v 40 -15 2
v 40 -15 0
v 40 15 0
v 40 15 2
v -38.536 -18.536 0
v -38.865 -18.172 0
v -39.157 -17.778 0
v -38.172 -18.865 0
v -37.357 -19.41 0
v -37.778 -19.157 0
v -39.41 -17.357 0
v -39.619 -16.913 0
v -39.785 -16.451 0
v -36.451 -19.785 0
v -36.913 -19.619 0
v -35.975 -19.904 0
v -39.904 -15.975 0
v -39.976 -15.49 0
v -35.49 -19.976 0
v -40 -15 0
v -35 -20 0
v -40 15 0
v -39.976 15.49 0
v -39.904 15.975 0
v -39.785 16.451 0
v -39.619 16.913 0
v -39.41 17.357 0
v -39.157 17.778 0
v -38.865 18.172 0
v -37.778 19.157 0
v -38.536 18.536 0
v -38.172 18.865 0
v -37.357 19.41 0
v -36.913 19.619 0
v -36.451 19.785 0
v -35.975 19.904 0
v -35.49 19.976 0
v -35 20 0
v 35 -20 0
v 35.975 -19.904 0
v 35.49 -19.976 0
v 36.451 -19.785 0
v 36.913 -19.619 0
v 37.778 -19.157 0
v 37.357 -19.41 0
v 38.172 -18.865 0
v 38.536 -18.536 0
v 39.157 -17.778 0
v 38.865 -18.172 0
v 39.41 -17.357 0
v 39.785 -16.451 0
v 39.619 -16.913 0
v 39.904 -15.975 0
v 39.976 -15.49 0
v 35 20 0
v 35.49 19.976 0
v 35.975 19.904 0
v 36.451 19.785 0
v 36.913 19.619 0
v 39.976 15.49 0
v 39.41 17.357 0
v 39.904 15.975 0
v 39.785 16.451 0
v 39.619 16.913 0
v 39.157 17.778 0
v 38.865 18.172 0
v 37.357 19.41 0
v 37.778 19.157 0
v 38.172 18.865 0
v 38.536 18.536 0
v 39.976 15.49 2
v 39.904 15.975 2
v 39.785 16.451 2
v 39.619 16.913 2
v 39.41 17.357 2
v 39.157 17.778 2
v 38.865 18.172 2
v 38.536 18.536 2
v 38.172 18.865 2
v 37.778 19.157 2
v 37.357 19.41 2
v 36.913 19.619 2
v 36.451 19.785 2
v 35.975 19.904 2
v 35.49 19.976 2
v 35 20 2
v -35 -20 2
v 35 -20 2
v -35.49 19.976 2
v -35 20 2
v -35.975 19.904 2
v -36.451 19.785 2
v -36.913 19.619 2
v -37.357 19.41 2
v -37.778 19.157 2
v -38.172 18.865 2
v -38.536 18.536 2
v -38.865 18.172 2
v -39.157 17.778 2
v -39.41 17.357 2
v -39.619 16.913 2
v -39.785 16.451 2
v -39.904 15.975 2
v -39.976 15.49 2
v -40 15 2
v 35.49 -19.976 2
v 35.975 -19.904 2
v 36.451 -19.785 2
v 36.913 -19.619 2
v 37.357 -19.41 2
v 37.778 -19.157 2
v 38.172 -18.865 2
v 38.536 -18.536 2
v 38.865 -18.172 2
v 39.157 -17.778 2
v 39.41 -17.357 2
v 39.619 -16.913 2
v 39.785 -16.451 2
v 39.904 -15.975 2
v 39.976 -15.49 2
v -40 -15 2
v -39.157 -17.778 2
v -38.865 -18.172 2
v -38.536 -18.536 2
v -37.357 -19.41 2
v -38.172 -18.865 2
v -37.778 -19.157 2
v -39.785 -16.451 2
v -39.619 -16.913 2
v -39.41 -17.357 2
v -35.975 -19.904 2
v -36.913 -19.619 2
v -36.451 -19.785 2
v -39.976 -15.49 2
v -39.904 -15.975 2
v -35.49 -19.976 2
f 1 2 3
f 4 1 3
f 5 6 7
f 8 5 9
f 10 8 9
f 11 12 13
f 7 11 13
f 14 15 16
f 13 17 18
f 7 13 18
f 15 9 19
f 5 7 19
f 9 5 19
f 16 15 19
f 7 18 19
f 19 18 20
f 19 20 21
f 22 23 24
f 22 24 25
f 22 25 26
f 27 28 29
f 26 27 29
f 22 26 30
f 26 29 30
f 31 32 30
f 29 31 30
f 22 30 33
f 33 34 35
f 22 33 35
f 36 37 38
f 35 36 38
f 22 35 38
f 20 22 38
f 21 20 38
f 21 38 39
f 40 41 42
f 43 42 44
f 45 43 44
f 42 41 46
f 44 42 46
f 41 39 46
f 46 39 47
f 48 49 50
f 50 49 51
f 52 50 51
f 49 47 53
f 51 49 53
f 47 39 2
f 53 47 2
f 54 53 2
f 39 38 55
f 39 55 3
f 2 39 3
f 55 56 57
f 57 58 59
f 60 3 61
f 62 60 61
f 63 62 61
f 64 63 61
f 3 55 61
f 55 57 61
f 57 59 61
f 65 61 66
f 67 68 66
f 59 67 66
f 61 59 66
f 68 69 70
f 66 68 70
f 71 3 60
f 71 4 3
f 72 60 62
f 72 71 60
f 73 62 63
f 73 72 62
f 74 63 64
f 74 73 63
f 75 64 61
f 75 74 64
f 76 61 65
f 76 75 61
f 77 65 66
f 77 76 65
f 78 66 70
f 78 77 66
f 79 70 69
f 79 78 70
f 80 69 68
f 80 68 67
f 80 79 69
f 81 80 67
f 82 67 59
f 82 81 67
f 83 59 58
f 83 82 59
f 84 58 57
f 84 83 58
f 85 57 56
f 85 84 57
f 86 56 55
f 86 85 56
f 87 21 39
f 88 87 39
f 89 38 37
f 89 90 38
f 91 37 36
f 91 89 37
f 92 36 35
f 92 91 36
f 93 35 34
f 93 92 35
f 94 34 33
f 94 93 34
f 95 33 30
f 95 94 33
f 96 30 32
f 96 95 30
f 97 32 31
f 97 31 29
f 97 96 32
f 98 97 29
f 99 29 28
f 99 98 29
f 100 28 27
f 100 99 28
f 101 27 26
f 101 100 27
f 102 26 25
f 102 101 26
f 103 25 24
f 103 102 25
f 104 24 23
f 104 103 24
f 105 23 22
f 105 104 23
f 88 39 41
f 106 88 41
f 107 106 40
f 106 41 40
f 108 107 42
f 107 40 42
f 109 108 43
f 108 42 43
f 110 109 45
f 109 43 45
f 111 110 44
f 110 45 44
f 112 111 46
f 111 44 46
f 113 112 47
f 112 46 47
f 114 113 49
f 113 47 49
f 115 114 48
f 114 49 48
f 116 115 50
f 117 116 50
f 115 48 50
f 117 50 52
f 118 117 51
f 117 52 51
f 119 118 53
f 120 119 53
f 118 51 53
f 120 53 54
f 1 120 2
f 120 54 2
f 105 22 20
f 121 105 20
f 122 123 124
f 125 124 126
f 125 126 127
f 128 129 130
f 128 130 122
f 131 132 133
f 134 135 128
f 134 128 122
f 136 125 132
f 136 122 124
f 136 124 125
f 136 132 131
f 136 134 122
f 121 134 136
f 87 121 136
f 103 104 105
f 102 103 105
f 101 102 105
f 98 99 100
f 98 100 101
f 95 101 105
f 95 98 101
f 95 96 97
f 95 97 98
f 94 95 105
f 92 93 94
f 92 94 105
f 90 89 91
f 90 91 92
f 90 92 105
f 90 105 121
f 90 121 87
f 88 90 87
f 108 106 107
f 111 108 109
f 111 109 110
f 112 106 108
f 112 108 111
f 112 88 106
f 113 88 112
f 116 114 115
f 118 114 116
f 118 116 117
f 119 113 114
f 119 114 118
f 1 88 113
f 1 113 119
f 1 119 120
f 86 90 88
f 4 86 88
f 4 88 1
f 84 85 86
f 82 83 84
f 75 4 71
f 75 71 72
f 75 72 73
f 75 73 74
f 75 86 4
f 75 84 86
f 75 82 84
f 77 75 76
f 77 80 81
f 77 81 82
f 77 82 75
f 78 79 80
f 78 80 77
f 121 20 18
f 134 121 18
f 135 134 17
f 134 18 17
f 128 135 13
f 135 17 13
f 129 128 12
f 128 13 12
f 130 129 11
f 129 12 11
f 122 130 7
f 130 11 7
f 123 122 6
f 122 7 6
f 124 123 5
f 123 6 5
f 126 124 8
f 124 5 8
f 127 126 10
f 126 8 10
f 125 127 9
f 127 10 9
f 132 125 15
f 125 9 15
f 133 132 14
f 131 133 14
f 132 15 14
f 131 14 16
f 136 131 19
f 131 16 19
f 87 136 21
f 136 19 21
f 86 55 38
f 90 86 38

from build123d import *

# Parameters (mm, degrees)
EXTRUDE_1_DEPTH = 2
FILLET_1_R      = 5


with BuildPart() as part:
    # Эскиз1 → Бобышка-Вытянуть1 (new body)
    with BuildSketch(Plane.XY):
        with BuildLine():
            Line((-35, -20), (35, -20))
            ThreePointArc((35, -20), (38.535533906, -18.535533906), (40, -15))
            Line((40, -15), (40, 20))
            Line((40, 20), (-40, 20))
            Line((-40, 20), (-40, -15))
            ThreePointArc((-40, -15), (-38.535533906, -18.535533906), (-35, -20))
        make_face()
    extrude(amount=EXTRUDE_1_DEPTH)

    # Скругление1
    fillet_1_edges = [part.edges().sort_by_distance(p)[0] for p in [
        (-40, 20, 1),
        (40, 20, 1),
    ]]
    fillet(fillet_1_edges, radius=FILLET_1_R)


solid = part.part
